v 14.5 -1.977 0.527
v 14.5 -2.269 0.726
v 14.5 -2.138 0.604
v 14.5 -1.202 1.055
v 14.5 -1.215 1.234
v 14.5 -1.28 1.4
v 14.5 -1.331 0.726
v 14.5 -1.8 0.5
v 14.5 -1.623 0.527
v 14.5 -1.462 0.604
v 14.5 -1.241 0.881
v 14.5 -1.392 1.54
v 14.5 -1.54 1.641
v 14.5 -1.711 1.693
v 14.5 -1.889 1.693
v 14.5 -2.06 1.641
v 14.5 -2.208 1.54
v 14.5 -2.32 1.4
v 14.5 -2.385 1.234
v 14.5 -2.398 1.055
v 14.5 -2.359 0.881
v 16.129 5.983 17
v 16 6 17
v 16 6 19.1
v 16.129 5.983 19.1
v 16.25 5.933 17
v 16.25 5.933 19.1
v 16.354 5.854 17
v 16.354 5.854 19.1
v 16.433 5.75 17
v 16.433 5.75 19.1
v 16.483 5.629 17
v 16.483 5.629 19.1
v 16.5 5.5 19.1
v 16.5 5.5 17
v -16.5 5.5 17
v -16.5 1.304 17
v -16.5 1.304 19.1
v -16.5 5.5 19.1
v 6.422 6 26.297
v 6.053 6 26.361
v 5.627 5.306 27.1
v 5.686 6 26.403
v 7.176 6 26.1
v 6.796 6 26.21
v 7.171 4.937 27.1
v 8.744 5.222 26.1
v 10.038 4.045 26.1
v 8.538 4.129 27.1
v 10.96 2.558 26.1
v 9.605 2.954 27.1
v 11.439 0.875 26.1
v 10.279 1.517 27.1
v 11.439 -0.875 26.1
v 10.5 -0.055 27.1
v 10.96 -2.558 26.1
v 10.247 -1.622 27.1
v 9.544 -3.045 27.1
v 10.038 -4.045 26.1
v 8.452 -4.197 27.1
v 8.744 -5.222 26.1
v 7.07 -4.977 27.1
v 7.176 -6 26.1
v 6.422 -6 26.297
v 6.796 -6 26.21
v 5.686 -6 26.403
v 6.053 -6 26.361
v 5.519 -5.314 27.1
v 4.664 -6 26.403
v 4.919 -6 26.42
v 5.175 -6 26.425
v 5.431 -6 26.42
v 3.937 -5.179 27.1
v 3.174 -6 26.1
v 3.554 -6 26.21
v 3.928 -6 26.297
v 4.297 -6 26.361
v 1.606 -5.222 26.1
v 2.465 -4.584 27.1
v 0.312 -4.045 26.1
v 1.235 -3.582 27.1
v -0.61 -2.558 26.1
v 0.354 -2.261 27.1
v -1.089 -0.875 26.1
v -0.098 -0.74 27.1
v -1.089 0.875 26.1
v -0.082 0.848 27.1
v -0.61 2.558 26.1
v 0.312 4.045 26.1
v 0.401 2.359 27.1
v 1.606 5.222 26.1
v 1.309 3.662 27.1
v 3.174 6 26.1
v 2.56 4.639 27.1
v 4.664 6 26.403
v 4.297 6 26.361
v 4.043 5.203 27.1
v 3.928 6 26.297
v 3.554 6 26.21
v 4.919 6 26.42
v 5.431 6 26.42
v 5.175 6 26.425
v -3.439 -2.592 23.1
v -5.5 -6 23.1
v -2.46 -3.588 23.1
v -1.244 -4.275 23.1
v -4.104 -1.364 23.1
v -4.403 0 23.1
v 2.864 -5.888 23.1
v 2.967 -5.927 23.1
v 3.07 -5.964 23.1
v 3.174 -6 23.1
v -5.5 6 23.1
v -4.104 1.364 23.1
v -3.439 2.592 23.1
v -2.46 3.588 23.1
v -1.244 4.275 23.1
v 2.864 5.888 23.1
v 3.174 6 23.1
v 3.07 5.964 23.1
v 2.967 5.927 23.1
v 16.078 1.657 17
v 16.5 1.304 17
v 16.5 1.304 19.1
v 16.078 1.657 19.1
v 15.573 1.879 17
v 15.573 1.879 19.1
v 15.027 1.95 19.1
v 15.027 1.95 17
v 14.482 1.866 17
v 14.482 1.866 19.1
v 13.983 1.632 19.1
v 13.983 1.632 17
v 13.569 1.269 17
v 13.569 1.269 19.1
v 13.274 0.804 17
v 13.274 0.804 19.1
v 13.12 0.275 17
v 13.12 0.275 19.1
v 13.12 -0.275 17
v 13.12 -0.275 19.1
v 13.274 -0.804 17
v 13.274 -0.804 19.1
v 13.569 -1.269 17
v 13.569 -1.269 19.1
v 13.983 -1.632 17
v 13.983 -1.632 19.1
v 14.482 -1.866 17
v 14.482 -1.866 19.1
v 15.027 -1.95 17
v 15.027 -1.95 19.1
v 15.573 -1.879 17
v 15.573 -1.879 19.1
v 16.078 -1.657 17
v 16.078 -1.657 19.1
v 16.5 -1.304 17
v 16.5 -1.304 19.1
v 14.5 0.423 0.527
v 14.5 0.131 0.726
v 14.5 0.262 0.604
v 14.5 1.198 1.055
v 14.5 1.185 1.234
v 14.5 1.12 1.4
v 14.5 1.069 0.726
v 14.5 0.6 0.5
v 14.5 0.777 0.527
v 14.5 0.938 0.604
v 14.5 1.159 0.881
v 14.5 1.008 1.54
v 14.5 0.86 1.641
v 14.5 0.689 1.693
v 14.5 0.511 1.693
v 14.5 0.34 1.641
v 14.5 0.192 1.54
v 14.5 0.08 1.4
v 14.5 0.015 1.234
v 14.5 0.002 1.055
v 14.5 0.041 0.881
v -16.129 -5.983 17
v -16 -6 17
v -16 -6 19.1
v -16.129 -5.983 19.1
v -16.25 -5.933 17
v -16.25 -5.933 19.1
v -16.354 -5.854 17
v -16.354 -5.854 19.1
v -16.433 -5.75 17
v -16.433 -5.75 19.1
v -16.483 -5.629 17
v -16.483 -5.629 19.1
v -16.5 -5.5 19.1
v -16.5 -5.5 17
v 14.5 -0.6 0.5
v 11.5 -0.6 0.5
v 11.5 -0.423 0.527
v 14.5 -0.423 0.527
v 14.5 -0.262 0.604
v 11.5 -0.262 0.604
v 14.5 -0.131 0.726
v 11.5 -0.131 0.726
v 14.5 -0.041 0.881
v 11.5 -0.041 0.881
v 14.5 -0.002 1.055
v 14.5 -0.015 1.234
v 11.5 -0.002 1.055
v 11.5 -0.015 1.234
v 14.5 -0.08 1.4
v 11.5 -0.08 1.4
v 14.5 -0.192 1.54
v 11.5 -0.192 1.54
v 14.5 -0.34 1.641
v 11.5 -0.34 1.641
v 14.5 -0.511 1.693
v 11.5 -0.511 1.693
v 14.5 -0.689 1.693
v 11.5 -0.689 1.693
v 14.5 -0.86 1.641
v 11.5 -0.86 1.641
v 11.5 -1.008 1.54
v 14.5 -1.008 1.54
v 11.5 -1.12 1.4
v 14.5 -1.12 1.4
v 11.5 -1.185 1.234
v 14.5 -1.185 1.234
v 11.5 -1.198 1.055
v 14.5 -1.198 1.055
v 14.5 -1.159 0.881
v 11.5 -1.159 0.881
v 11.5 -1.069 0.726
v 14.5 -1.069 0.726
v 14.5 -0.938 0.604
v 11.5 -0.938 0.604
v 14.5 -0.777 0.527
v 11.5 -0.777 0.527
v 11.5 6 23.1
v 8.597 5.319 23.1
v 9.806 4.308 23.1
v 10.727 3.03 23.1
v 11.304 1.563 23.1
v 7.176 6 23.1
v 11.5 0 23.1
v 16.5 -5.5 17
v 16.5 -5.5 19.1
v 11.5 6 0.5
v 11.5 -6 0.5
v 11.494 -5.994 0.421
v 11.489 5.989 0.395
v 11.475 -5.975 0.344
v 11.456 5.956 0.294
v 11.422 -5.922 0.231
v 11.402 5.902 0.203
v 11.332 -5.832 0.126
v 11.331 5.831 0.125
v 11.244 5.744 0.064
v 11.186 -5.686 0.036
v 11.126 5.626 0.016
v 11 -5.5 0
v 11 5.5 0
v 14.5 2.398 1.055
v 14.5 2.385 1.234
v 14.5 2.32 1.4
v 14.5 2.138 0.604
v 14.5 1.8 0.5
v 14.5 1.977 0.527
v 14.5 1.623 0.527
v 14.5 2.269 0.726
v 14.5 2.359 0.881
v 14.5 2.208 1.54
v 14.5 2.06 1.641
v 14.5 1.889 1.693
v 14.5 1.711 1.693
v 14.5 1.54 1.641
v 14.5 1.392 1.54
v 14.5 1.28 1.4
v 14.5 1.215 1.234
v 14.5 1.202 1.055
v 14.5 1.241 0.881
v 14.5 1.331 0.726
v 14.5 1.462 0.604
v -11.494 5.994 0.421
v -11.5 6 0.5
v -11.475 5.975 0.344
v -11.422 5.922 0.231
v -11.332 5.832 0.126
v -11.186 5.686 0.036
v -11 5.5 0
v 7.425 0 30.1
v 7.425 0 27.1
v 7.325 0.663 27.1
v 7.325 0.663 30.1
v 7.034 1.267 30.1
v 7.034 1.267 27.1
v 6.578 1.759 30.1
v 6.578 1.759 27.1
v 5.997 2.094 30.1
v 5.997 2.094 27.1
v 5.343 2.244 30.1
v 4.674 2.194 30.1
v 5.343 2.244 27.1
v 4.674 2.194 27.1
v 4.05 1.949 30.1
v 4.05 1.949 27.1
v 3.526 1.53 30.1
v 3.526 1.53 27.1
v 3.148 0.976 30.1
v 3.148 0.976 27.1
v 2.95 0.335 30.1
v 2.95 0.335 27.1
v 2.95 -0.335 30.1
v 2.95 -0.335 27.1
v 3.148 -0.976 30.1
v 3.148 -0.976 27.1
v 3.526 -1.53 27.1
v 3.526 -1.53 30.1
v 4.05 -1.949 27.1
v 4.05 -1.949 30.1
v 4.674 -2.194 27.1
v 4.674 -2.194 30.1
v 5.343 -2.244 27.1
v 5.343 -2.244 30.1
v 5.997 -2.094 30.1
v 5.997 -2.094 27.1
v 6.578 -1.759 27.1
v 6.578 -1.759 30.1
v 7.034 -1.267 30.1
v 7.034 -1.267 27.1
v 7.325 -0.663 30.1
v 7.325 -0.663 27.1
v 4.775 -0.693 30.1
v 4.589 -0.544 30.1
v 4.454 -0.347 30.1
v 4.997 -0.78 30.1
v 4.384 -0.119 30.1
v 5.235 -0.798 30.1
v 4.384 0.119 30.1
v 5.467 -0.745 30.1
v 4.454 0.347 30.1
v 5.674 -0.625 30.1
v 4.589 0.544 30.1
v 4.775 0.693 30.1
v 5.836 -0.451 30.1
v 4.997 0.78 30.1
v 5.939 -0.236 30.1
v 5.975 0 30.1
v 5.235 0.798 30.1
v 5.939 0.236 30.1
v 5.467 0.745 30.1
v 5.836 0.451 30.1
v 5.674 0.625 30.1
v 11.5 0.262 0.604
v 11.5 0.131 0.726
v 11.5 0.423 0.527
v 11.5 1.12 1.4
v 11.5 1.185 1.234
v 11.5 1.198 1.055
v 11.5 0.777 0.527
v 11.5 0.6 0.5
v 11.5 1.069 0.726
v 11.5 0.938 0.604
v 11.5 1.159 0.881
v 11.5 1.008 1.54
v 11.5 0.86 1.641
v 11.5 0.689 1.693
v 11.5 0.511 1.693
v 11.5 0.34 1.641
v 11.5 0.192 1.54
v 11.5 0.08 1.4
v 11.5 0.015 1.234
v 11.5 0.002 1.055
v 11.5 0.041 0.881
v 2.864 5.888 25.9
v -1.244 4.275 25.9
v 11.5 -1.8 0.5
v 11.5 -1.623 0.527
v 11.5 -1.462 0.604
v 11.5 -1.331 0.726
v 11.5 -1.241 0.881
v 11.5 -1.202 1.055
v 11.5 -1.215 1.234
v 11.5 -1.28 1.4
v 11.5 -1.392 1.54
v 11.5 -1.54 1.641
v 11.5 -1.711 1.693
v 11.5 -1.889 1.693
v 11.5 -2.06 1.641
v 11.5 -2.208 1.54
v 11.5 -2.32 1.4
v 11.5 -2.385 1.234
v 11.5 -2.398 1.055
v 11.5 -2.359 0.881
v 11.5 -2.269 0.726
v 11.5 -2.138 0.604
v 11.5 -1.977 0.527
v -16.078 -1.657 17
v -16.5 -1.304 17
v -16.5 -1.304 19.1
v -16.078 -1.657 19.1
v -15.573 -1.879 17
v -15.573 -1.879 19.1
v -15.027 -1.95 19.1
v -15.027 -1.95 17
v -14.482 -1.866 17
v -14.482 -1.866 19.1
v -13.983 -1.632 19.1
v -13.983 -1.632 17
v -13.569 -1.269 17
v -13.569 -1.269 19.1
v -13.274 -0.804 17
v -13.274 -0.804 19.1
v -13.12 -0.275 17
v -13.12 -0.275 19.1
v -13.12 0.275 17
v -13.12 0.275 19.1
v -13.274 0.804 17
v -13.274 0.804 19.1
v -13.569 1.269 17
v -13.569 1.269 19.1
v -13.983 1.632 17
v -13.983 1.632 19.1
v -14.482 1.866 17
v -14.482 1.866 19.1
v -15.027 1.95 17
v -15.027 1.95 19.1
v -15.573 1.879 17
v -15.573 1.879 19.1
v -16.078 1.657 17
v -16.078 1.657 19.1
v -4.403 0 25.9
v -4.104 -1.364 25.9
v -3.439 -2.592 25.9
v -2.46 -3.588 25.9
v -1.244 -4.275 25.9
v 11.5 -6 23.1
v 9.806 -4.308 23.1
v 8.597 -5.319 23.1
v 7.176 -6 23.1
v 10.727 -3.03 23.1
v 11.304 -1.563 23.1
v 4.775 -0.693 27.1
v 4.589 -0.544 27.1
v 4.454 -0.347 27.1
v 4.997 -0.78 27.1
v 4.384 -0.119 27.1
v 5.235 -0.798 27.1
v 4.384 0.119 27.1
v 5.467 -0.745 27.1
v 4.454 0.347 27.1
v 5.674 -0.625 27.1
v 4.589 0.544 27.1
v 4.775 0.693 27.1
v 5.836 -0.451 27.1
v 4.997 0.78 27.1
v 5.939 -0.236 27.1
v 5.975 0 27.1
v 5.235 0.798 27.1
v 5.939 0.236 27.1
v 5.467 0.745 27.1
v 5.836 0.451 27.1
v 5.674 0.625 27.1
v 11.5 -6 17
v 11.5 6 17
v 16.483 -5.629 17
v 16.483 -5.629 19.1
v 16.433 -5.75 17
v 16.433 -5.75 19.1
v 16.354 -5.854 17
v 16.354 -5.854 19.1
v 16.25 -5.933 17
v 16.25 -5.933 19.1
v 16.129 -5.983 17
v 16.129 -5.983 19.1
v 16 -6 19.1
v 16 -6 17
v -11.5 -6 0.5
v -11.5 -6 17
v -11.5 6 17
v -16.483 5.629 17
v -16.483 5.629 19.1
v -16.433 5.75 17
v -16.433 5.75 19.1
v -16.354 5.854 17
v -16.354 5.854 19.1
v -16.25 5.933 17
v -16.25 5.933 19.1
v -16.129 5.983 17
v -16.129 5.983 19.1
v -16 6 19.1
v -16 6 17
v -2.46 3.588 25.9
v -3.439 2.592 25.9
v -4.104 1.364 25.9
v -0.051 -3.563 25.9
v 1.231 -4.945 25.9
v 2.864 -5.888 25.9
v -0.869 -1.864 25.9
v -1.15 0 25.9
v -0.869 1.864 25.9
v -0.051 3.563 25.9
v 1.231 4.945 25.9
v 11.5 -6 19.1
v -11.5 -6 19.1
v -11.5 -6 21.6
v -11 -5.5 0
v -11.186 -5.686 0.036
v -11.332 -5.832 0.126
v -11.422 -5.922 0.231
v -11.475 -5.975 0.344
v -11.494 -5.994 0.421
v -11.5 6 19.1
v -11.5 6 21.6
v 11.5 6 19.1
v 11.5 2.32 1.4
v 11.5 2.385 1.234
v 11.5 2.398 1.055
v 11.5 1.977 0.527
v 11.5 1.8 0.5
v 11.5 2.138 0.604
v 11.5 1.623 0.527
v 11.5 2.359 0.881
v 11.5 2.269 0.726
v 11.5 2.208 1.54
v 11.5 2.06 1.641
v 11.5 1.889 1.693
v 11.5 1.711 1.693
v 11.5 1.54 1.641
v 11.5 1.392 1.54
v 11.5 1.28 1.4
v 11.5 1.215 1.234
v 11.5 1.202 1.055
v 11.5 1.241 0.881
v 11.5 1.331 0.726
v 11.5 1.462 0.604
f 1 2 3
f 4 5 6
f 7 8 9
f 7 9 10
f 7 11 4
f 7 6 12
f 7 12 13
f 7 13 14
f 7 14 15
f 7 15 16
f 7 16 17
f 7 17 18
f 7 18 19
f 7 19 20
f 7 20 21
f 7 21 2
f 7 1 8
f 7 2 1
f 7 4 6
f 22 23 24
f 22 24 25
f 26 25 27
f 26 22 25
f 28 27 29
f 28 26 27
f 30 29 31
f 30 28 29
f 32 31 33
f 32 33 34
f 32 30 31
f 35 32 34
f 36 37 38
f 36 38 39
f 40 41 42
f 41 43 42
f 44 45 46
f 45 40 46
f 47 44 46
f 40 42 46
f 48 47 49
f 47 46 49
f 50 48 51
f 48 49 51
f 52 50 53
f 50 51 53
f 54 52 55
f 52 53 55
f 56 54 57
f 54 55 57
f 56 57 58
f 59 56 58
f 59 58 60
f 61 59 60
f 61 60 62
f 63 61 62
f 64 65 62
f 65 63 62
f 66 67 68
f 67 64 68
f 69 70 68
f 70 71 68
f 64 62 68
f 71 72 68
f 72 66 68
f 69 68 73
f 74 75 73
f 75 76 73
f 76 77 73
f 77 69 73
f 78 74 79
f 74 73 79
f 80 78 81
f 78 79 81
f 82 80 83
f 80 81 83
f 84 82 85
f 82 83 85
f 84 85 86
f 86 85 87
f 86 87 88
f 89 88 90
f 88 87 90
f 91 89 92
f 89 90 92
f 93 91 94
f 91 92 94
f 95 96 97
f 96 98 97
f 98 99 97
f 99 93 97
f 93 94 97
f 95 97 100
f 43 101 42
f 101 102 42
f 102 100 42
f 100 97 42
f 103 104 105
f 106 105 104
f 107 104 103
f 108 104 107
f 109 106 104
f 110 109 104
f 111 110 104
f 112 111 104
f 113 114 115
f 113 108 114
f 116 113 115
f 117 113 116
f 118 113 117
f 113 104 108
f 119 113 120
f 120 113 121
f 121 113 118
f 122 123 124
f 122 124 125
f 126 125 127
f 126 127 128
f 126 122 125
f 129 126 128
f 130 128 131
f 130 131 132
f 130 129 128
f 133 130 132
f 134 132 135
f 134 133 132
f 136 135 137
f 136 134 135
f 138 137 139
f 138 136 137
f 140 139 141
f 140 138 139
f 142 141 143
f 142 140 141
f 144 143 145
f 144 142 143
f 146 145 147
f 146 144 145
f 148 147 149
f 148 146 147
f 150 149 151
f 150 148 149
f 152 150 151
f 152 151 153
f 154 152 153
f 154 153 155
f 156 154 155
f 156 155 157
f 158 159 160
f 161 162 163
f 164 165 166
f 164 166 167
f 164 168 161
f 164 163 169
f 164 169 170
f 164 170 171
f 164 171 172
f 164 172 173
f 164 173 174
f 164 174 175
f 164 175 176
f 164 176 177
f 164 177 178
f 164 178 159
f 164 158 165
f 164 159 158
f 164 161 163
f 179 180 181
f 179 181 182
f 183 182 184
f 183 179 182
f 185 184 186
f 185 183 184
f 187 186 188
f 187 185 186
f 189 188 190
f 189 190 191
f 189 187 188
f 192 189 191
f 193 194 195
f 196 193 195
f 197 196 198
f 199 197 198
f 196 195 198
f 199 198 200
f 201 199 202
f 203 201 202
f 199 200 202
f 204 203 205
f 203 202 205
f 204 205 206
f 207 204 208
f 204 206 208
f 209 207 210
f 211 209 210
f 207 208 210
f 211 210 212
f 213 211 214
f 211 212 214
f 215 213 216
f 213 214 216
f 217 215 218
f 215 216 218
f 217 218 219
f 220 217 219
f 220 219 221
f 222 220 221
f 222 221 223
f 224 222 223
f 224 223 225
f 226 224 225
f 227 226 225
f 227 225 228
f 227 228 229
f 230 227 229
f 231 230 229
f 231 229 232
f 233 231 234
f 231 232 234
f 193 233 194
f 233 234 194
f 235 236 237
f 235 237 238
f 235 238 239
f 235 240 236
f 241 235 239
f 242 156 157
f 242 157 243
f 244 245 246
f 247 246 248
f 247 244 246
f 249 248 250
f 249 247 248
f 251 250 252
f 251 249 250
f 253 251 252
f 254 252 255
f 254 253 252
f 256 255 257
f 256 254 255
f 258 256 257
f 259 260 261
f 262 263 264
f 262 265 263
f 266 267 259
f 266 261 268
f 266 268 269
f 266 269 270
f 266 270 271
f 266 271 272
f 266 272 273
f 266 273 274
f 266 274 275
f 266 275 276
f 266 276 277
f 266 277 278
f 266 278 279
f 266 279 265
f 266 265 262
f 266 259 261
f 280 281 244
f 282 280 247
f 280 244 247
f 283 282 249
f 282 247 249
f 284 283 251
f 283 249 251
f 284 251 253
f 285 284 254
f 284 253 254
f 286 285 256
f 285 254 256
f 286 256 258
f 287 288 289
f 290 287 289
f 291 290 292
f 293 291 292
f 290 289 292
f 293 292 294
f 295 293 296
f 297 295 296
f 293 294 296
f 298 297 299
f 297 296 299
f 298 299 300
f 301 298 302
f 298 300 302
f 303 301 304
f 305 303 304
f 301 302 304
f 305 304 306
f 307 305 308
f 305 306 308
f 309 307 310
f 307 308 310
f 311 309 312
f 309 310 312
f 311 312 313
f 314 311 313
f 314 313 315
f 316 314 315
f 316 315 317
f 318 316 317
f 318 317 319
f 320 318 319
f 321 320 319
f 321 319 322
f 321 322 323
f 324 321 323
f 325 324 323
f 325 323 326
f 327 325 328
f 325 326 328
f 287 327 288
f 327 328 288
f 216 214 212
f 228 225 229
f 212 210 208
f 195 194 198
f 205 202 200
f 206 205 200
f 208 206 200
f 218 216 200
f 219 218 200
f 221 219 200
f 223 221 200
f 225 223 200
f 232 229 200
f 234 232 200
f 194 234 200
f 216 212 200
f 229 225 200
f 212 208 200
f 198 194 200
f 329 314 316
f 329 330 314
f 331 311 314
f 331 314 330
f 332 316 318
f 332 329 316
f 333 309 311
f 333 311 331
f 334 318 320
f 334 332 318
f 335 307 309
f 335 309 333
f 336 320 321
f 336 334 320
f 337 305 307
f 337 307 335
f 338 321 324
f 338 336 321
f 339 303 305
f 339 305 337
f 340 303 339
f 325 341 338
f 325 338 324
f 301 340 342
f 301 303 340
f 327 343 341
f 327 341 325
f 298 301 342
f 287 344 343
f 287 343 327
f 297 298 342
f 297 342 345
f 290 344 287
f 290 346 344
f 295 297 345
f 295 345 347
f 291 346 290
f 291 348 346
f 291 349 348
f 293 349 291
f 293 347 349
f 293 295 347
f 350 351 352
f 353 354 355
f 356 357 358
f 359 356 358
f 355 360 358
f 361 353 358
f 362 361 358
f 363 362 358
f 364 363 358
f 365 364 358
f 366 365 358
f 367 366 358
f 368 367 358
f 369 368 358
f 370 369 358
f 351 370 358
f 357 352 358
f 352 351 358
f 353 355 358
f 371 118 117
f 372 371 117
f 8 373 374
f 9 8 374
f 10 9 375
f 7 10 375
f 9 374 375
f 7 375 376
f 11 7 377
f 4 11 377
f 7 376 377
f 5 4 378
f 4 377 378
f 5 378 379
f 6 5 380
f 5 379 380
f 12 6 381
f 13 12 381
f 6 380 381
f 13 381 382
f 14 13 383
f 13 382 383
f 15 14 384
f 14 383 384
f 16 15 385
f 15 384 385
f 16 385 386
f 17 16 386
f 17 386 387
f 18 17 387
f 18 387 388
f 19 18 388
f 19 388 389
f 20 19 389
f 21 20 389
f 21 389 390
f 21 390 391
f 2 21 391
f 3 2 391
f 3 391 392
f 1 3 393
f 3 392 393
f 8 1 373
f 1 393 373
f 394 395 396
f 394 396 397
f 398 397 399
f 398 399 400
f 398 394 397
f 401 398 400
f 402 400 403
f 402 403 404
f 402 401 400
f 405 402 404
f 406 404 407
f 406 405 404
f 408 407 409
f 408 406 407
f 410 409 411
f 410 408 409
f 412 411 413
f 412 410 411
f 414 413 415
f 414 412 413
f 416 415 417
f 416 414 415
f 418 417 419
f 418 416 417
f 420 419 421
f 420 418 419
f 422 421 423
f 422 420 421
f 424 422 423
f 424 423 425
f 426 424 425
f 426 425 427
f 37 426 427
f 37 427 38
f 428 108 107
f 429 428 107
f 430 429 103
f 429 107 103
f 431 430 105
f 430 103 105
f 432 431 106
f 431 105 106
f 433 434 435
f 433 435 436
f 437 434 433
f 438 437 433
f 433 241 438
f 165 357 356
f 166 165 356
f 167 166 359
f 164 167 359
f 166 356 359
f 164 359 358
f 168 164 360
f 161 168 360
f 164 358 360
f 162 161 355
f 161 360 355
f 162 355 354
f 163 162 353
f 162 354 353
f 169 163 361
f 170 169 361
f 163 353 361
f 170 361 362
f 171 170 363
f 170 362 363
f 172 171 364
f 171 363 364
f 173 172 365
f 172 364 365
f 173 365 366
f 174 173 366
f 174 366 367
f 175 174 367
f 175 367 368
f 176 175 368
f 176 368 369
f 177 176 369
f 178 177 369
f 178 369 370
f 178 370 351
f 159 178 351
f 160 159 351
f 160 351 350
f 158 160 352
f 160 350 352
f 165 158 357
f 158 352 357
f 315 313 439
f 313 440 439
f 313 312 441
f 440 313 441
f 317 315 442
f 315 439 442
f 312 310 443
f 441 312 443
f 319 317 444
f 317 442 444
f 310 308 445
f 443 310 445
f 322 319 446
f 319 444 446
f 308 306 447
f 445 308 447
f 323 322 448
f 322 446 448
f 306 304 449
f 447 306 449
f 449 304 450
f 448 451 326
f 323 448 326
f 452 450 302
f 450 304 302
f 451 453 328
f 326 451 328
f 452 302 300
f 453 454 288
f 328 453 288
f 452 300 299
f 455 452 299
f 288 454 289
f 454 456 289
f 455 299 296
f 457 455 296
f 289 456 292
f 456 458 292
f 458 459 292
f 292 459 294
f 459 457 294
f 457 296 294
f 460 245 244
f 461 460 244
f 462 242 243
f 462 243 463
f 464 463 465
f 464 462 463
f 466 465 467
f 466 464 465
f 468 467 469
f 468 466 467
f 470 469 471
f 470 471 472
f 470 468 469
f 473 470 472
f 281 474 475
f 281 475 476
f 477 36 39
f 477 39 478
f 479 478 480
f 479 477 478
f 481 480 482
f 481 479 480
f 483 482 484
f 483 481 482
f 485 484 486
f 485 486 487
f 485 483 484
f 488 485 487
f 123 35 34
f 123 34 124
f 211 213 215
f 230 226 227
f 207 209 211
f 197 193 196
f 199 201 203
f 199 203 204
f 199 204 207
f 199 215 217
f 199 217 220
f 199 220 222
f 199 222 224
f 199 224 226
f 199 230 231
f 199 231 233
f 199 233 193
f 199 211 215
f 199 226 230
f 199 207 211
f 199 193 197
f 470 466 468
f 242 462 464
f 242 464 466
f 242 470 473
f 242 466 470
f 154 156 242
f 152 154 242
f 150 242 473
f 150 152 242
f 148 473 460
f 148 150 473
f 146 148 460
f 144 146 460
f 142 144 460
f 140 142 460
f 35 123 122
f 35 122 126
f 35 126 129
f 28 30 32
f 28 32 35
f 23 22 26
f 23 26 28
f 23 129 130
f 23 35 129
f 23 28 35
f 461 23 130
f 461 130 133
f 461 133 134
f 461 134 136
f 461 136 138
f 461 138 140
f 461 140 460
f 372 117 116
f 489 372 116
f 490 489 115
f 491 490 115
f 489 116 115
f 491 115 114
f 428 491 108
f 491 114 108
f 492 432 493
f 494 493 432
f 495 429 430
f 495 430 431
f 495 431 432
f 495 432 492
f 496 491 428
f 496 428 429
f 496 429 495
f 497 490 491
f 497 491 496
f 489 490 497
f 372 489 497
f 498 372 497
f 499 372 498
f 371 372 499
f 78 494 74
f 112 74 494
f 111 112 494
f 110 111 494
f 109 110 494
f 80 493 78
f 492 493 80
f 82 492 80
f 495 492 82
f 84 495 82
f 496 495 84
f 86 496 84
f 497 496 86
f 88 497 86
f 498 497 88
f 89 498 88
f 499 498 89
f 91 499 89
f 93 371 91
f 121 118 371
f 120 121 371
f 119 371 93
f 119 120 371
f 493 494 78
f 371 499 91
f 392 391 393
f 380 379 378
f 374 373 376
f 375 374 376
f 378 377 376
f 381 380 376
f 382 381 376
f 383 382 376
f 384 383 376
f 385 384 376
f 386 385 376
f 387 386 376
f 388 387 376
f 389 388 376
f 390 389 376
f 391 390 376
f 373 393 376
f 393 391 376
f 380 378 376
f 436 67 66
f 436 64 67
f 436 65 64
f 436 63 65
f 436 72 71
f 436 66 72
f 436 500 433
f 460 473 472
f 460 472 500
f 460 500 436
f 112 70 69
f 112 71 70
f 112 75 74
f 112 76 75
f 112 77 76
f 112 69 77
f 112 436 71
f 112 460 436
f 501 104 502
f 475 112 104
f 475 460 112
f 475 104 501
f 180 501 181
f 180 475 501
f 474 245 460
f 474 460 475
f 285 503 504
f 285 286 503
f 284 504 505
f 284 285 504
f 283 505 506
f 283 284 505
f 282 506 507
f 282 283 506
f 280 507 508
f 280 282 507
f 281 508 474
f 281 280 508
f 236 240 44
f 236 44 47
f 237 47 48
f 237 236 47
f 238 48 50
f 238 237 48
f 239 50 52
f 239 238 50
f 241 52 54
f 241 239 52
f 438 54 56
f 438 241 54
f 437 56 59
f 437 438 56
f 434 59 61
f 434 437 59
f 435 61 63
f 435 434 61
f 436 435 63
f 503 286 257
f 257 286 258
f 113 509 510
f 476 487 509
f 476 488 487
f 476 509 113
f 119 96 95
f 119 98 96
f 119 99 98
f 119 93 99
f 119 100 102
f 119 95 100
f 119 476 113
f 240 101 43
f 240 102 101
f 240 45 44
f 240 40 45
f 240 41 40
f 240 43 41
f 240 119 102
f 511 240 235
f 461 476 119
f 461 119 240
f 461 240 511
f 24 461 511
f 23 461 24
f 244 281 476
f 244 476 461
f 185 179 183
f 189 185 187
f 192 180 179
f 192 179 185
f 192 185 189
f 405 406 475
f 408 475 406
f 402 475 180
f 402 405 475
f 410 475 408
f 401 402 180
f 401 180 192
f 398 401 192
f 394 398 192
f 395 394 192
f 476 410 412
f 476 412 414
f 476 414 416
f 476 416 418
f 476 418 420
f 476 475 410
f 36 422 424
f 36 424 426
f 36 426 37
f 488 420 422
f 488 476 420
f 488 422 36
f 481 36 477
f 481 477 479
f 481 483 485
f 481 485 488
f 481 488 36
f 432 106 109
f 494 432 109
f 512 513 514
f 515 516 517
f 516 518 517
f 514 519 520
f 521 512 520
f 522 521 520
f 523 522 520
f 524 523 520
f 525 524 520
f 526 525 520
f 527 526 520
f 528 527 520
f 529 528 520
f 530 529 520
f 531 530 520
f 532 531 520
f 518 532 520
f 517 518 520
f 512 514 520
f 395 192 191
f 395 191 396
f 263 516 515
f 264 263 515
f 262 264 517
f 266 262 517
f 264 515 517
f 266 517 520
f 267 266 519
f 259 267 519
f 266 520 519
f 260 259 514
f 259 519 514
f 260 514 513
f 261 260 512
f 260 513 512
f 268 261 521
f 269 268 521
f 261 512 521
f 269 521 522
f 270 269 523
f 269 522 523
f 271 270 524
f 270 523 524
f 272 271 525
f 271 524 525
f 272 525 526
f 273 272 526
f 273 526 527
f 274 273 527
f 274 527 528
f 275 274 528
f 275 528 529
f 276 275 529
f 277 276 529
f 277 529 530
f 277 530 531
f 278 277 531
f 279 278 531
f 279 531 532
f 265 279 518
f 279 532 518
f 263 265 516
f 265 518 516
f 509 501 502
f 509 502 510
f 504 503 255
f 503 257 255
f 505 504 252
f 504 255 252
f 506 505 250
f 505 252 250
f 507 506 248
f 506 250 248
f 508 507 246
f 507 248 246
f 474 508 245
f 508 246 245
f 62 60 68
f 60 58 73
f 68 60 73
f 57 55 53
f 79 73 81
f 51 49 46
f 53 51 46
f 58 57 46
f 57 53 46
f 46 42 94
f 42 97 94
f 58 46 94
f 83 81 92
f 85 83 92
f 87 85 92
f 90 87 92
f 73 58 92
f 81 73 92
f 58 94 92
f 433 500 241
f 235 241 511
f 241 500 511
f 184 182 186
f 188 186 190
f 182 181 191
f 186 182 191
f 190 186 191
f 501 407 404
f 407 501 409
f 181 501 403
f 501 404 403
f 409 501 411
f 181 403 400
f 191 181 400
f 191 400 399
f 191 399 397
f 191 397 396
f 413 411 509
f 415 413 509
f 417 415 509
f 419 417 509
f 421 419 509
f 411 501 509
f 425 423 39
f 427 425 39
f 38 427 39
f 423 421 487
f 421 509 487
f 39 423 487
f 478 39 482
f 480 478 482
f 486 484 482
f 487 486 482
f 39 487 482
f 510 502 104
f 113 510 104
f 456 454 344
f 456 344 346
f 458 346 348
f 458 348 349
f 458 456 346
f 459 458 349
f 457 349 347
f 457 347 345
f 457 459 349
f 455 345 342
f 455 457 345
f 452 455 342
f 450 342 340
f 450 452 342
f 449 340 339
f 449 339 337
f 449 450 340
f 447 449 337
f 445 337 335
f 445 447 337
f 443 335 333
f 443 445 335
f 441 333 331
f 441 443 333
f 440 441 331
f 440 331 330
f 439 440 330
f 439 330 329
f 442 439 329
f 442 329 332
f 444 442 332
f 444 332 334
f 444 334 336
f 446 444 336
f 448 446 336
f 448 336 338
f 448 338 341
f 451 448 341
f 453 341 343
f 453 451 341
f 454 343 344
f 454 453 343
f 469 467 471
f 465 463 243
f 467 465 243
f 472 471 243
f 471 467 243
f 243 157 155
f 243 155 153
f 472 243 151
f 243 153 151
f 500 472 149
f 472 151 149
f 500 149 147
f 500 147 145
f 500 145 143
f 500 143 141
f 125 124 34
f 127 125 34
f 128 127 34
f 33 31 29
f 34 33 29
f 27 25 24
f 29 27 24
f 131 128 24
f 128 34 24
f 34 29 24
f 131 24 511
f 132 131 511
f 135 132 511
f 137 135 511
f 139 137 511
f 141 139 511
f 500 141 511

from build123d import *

# Parameters (mm, degrees)
ESQUISSE1_W             = 23
ESQUISSE1_H             = 12
BOSS_EXTRU_1_DEPTH      = 17
BOSS_EXTRU_2_DEPTH      = 2.1
ESQUISSE3_W             = 23
ESQUISSE3_H             = 12
BOSS_EXTRU_3_DEPTH      = 4
CONG_1_R                = 0.5
BOSS_EXTRU_4_DEPTH      = 4
CHANFREIN1_SIZE         = 1
ENL_V_MAT_EXTRU_1_DEPTH = 34.921379689
BOSS_EXTRU_5_DEPTH      = 2.8
ESQUISSE8_R             = 2.25
ESQUISSE8_R_2           = 0.8
BOSS_EXTRU_6_DEPTH      = 3
ESQUISSE9_R             = 0.6
BOSS_EXTRU_7_DEPTH      = 3
BOSS_EXTRU_7_2_DEPTH    = 3
BOSS_EXTRU_7_3_DEPTH    = 3
BOSS_EXTRU_7_4_DEPTH    = 3


with BuildPart() as part:
    # Esquisse1 → Boss.-Extru.1 (new body)
    with BuildSketch(Plane.XY):
        Rectangle(ESQUISSE1_W, ESQUISSE1_H)
    extrude(amount=BOSS_EXTRU_1_DEPTH)

    # Esquisse2 → Boss.-Extru.2 (add)
    with BuildSketch(Plane.XY.offset(17)):
        with BuildLine():
            Line((-16, 6), (16, 6))
            ThreePointArc((16, 6), (16.353553391, 5.853553391), (16.5, 5.5))
            Line((16.5, 5.5), (16.5, 1.303840481))
            ThreePointArc((16.5, 1.303840481), (13.1, 0), (16.5, -1.303840481))
            Line((16.5, -1.303840481), (16.5, -5.5))
            ThreePointArc((16.5, -5.5), (16.353553391, -5.853553391), (16, -6))
            Line((16, -6), (-16, -6))
            ThreePointArc((-16, -6), (-16.353553391, -5.853553391), (-16.5, -5.5))
            Line((-16.5, -5.5), (-16.5, -1.303840481))
            ThreePointArc((-16.5, -1.303840481), (-13.1, 0), (-16.5, 1.303840481))
            Line((-16.5, 1.303840481), (-16.5, 5.5))
            ThreePointArc((-16.5, 5.5), (-16.353553391, 5.853553391), (-16, 6))
        make_face()
    extrude(amount=BOSS_EXTRU_2_DEPTH)

    # Esquisse3 → Boss.-Extru.3 (add)
    with BuildSketch(Plane.XY.offset(19.1)):
        Rectangle(ESQUISSE3_W, ESQUISSE3_H)
    extrude(amount=BOSS_EXTRU_3_DEPTH)

    # Congé1
    cong_1_edges = [part.edges().sort_by_distance(p)[0] for p in [
        (0, -6, 0),
        (-11.5, 0, 0),
        (0, 6, 0),
        (11.5, 0, 0),
    ]]
    fillet(cong_1_edges, radius=CONG_1_R)

    # Esquisse5 → Boss.-Extru.4 (add)
    with BuildSketch(Plane.XY.offset(23.1)):
        with BuildLine():
            Line((3.173594244, 6), (7.176405756, 6))
            ThreePointArc((7.176405756, 6), (11.5, 0), (7.176405756, -6))
            Line((7.176405756, -6), (3.173594244, -6))
            ThreePointArc((3.173594244, -6), (-1.15, 0), (3.173594244, 6))
        make_face()
    extrude(amount=BOSS_EXTRU_4_DEPTH)

    # Chanfrein1
    # the kernel refuses this chamfer: 1 mm, written as the material it takes off along each edge
    with BuildSketch(Plane(origin=(5.175, 0, 27.1), x_dir=(0.08493945203394825, -0.9963861146604627, 0), z_dir=(0.9963861146604627, 0.08493945203394825, 0))) as chanfrein1_piece_1:
        Polygon((6.325, CHANFREIN1_SIZE), (6.325 - CHANFREIN1_SIZE, 0), (6.325, 0), align=None)
    revolve(axis=Axis((5.175, 0, 27.1), (0, 0, -1)), revolution_arc=189.74508627, mode=Mode.SUBTRACT)
    with BuildSketch(Plane(origin=(5.175, 0, 27.1), x_dir=(-0.08493945203394813, 0.9963861146604627, 0), z_dir=(-0.9963861146604627, -0.08493945203394813, 0))) as chanfrein1_piece_2:
        Polygon((6.325, CHANFREIN1_SIZE), (6.325 - CHANFREIN1_SIZE, 0), (6.325, 0), align=None)
    revolve(axis=Axis((5.175, 0, 27.1), (0, 0, -1)), revolution_arc=189.74508627, mode=Mode.SUBTRACT)

    # Esquisse6 → Enlèv. mat.-Extru.1 (cut, through all)
    with BuildSketch(Plane.XZ.offset(6)):
        Polygon((-11.5, 21.6), (-5.5, 23.1), (-11.5, 23.1), align=None)
    extrude(amount=-ENL_V_MAT_EXTRU_1_DEPTH, mode=Mode.SUBTRACT)

    # Esquisse7 → Boss.-Extru.5 (add)
    with BuildSketch(Plane.XY.offset(23.1)):
        with BuildLine():
            Line((-1.244498087, -4.275128639), (2.864099339, -5.88772988))
            ThreePointArc((2.864099339, -5.88772988), (-1.15, 0), (2.864099339, 5.88772988))
            Line((2.864099339, 5.88772988), (-1.244498087, 4.275128639))
            ThreePointArc((-1.244498087, 4.275128639), (-3.439063989, 2.592096904), (-4.403298896, 0))
            ThreePointArc((-4.403298896, 0), (-3.439063989, -2.592096904), (-1.244498087, -4.275128639))
        make_face()
    extrude(amount=BOSS_EXTRU_5_DEPTH)


with BuildPart() as body_2:
    # Esquisse8 → Boss.-Extru.6 (new body)
    with BuildSketch(Plane.XY.offset(27.1)):
        with Locations((5.175, 0)):
            Circle(ESQUISSE8_R)
        with Locations((5.175, 0)):
            Circle(ESQUISSE8_R_2, mode=Mode.SUBTRACT)
    extrude(amount=BOSS_EXTRU_6_DEPTH)


with BuildPart() as body_3:
    # Esquisse9 → Boss.-Extru.7 (new body)
    with BuildSketch(Plane(origin=(11.5, 0, 0), x_dir=(0, 0, -1), z_dir=(1, 0, 0))):
        with Locations((-1.1, 1.8)):
            Circle(ESQUISSE9_R)
    extrude(amount=BOSS_EXTRU_7_DEPTH)


with BuildPart() as body_4:
    # Esquisse9 → Boss.-Extru.7 2 (new body)
    with BuildSketch(Plane(origin=(11.5, 0, 0), x_dir=(0, 0, -1), z_dir=(1, 0, 0))):
        with Locations((-1.1, 0.6)):
            Circle(ESQUISSE9_R)
    extrude(amount=BOSS_EXTRU_7_2_DEPTH)


with BuildPart() as body_5:
    # Esquisse9 → Boss.-Extru.7 3 (new body)
    with BuildSketch(Plane(origin=(11.5, 0, 0), x_dir=(0, 0, -1), z_dir=(1, 0, 0))):
        with Locations((-1.1, -0.6)):
            Circle(ESQUISSE9_R)
    extrude(amount=BOSS_EXTRU_7_3_DEPTH)


with BuildPart() as body_6:
    # Esquisse9 → Boss.-Extru.7 4 (new body)
    with BuildSketch(Plane(origin=(11.5, 0, 0), x_dir=(0, 0, -1), z_dir=(1, 0, 0))):
        with Locations((-1.1, -1.8)):
            Circle(ESQUISSE9_R)
    extrude(amount=BOSS_EXTRU_7_4_DEPTH)


solid = Compound([part.part, body_2.part, body_3.part, body_4.part, body_5.part, body_6.part])
